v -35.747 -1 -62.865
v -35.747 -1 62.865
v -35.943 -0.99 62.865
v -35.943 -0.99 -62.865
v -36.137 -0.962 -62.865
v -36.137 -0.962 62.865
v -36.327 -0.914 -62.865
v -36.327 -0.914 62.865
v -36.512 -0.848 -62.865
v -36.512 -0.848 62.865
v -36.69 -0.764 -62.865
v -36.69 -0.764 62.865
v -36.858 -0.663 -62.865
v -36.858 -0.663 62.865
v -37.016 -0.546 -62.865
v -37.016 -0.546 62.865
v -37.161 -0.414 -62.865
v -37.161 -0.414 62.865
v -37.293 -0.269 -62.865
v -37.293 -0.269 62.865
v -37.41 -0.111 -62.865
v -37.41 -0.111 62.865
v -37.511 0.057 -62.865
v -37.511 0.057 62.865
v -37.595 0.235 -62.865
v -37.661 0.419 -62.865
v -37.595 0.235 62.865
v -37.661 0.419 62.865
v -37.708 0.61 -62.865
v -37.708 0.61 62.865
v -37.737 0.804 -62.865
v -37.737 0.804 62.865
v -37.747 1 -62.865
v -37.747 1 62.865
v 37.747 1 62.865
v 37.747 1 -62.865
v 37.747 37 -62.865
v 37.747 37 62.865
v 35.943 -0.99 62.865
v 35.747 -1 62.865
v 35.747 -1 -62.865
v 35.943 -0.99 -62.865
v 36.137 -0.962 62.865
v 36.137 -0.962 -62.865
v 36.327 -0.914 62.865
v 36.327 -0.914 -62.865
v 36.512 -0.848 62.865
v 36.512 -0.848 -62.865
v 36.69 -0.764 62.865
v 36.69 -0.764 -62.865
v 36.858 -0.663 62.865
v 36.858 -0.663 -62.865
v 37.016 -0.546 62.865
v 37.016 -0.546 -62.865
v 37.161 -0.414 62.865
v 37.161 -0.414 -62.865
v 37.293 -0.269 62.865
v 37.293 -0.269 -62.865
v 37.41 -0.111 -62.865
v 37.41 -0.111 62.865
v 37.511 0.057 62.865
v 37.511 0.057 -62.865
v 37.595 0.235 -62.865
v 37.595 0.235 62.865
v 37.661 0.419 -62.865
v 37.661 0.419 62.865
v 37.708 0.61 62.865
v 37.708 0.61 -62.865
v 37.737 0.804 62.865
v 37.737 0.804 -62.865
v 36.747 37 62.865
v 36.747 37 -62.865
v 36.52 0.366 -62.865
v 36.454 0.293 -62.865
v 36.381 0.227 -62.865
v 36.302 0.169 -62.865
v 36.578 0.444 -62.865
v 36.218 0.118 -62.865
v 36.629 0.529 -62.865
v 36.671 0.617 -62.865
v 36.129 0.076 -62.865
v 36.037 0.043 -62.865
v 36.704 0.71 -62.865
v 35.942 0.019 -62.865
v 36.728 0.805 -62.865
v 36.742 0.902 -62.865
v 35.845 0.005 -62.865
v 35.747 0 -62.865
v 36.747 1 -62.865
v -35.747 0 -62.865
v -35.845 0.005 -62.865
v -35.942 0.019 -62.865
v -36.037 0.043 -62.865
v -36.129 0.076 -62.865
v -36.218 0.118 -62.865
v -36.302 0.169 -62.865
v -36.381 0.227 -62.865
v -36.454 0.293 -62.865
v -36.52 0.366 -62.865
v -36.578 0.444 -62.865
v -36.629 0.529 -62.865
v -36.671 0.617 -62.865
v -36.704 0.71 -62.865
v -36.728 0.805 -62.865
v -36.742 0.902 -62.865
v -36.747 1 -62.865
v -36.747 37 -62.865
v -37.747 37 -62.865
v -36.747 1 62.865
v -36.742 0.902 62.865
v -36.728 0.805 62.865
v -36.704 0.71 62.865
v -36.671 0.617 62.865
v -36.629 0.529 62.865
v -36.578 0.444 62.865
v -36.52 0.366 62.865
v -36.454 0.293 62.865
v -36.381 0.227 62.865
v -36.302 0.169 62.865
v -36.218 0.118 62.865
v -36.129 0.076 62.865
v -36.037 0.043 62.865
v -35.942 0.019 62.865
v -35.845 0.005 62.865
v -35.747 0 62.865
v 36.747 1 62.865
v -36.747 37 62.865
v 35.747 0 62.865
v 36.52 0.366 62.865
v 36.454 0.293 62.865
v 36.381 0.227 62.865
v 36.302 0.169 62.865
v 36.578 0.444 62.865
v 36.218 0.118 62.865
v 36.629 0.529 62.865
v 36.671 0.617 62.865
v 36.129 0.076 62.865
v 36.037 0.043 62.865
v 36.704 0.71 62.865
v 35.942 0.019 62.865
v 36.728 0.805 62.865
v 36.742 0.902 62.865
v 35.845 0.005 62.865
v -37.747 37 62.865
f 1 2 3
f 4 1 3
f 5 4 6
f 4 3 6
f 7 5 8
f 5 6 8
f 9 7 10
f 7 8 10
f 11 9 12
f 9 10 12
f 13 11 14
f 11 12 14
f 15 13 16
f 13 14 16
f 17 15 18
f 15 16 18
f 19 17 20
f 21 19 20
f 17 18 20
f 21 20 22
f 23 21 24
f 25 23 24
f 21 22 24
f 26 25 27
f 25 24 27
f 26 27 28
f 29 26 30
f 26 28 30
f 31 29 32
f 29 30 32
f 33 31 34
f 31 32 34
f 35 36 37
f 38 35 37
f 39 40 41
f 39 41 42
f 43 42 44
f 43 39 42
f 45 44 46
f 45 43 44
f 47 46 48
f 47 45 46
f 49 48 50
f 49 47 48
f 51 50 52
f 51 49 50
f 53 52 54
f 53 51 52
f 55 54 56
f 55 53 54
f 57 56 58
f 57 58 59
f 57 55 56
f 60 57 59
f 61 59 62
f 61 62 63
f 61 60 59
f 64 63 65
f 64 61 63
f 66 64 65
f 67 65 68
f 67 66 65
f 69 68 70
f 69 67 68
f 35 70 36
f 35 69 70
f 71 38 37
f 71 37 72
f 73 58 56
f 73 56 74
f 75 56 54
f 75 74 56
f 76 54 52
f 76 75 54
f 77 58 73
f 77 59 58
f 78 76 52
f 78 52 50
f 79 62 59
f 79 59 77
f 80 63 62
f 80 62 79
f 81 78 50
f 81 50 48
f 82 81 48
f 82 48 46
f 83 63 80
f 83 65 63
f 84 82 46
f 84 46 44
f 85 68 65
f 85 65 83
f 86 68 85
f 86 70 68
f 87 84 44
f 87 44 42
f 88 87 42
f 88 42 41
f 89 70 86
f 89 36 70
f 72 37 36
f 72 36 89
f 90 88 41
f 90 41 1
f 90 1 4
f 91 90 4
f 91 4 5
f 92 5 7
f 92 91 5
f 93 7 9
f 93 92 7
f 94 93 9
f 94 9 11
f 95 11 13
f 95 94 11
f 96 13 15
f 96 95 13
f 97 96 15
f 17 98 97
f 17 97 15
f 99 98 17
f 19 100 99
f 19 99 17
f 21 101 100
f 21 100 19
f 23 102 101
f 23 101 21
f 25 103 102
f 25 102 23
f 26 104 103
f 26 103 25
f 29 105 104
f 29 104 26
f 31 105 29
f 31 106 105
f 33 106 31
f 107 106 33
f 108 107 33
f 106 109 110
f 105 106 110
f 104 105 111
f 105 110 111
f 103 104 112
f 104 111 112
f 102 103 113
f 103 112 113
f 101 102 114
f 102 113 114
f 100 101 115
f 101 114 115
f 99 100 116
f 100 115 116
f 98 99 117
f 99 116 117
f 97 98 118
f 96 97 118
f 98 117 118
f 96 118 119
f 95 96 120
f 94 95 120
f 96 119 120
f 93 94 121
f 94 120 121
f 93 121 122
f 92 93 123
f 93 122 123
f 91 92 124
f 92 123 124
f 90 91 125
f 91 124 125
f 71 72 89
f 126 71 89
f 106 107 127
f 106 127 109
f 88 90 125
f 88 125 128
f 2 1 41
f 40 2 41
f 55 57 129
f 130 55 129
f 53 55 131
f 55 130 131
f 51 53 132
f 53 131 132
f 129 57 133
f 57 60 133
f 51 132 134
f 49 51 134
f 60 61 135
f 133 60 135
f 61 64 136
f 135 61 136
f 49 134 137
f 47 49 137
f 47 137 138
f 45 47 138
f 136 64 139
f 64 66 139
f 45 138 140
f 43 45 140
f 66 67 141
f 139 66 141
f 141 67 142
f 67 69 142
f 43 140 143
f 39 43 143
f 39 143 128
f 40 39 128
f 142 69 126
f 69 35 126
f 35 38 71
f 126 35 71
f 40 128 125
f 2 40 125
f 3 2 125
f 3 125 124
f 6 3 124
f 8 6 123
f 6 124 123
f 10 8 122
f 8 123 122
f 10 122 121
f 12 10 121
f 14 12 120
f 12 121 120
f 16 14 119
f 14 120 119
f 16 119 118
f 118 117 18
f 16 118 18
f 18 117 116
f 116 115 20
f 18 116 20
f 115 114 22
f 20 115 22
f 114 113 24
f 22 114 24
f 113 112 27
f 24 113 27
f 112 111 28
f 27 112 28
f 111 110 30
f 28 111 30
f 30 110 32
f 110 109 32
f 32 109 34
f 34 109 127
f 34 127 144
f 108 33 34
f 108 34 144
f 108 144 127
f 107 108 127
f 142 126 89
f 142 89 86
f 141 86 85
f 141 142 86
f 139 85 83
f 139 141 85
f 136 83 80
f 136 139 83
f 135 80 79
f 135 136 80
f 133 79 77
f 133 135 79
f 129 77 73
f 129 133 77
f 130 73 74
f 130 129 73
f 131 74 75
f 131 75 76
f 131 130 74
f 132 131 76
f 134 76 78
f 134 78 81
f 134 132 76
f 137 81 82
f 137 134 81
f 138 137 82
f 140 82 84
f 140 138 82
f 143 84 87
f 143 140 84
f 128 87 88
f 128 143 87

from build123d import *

# Parameters (mm, degrees)
SKETCH_2_W                       = 73.493597356
SKETCH_2_H                       = 125.730953214
SM_BASE_FLANGE_1_DEPTH           = 1
SM_EDGE_FLANGE_1_STRIP_W         = 6
SM_EDGE_FLANGE_1_STRIP_H         = 1
SM_EDGE_FLANGE_1_STRIP_CUT_DEPTH = 125.730953215
SM_EDGE_FLANGE_1_DEPTH           = 125.730953215


# Sheet-metal steps are written as plain solids
with BuildPart() as part:
    # Sketch 2 → Базовая кромка1 (new body)
    with BuildSketch(Plane(origin=(0, 0, 0), x_dir=(1, 0, 0), z_dir=(0, 1, 0))):
        Rectangle(SKETCH_2_W, SKETCH_2_H)
    extrude(amount=-SM_BASE_FLANGE_1_DEPTH)

    # Ребро-кромка1 strip (across the edge) → Ребро-кромка1 strip cut (cut)
    with BuildSketch(Plane(origin=(36.746798678, 0, 62.865476607), x_dir=(-1, 0, 0), z_dir=(0, 0, -1))):
        with Locations((-2, -0.5)):
            Rectangle(SM_EDGE_FLANGE_1_STRIP_W, SM_EDGE_FLANGE_1_STRIP_H)
    sm_edge_flange_1_strip_cut = extrude(amount=SM_EDGE_FLANGE_1_STRIP_CUT_DEPTH, mode=Mode.SUBTRACT)

    # Ребро-кромка1 section (across the edge) → Ребро-кромка1 (add)
    with BuildSketch(Plane(origin=(36.746798678, 0, 62.865476607), x_dir=(-1, 0, 0), z_dir=(0, 0, -1))):
        with BuildLine():
            Line((-1, 1), (-1, 37))
            Line((-1, 37), (0, 37))
            Line((0, 37), (0, 1))
            ThreePointArc((0, 1), (0.292893219, 0.292893219), (1, 0))
            Line((1, 0), (1, -1))
            ThreePointArc((1, -1), (-0.414213562, -0.414213562), (-1, 1))
        make_face()
    sm_edge_flange_1 = extrude(amount=SM_EDGE_FLANGE_1_DEPTH)

    # Зеркальное отражение1: Ребро-кромка1 strip cut, Ребро-кромка1 across plane
    add(sm_edge_flange_1_strip_cut.mirror(Plane(origin=(0, 0, 0), x_dir=(0, 0, 1), z_dir=(1, 0, 0))), mode=Mode.SUBTRACT)
    add(sm_edge_flange_1.mirror(Plane(origin=(0, 0, 0), x_dir=(0, 0, 1), z_dir=(1, 0, 0))))


solid = part.part
